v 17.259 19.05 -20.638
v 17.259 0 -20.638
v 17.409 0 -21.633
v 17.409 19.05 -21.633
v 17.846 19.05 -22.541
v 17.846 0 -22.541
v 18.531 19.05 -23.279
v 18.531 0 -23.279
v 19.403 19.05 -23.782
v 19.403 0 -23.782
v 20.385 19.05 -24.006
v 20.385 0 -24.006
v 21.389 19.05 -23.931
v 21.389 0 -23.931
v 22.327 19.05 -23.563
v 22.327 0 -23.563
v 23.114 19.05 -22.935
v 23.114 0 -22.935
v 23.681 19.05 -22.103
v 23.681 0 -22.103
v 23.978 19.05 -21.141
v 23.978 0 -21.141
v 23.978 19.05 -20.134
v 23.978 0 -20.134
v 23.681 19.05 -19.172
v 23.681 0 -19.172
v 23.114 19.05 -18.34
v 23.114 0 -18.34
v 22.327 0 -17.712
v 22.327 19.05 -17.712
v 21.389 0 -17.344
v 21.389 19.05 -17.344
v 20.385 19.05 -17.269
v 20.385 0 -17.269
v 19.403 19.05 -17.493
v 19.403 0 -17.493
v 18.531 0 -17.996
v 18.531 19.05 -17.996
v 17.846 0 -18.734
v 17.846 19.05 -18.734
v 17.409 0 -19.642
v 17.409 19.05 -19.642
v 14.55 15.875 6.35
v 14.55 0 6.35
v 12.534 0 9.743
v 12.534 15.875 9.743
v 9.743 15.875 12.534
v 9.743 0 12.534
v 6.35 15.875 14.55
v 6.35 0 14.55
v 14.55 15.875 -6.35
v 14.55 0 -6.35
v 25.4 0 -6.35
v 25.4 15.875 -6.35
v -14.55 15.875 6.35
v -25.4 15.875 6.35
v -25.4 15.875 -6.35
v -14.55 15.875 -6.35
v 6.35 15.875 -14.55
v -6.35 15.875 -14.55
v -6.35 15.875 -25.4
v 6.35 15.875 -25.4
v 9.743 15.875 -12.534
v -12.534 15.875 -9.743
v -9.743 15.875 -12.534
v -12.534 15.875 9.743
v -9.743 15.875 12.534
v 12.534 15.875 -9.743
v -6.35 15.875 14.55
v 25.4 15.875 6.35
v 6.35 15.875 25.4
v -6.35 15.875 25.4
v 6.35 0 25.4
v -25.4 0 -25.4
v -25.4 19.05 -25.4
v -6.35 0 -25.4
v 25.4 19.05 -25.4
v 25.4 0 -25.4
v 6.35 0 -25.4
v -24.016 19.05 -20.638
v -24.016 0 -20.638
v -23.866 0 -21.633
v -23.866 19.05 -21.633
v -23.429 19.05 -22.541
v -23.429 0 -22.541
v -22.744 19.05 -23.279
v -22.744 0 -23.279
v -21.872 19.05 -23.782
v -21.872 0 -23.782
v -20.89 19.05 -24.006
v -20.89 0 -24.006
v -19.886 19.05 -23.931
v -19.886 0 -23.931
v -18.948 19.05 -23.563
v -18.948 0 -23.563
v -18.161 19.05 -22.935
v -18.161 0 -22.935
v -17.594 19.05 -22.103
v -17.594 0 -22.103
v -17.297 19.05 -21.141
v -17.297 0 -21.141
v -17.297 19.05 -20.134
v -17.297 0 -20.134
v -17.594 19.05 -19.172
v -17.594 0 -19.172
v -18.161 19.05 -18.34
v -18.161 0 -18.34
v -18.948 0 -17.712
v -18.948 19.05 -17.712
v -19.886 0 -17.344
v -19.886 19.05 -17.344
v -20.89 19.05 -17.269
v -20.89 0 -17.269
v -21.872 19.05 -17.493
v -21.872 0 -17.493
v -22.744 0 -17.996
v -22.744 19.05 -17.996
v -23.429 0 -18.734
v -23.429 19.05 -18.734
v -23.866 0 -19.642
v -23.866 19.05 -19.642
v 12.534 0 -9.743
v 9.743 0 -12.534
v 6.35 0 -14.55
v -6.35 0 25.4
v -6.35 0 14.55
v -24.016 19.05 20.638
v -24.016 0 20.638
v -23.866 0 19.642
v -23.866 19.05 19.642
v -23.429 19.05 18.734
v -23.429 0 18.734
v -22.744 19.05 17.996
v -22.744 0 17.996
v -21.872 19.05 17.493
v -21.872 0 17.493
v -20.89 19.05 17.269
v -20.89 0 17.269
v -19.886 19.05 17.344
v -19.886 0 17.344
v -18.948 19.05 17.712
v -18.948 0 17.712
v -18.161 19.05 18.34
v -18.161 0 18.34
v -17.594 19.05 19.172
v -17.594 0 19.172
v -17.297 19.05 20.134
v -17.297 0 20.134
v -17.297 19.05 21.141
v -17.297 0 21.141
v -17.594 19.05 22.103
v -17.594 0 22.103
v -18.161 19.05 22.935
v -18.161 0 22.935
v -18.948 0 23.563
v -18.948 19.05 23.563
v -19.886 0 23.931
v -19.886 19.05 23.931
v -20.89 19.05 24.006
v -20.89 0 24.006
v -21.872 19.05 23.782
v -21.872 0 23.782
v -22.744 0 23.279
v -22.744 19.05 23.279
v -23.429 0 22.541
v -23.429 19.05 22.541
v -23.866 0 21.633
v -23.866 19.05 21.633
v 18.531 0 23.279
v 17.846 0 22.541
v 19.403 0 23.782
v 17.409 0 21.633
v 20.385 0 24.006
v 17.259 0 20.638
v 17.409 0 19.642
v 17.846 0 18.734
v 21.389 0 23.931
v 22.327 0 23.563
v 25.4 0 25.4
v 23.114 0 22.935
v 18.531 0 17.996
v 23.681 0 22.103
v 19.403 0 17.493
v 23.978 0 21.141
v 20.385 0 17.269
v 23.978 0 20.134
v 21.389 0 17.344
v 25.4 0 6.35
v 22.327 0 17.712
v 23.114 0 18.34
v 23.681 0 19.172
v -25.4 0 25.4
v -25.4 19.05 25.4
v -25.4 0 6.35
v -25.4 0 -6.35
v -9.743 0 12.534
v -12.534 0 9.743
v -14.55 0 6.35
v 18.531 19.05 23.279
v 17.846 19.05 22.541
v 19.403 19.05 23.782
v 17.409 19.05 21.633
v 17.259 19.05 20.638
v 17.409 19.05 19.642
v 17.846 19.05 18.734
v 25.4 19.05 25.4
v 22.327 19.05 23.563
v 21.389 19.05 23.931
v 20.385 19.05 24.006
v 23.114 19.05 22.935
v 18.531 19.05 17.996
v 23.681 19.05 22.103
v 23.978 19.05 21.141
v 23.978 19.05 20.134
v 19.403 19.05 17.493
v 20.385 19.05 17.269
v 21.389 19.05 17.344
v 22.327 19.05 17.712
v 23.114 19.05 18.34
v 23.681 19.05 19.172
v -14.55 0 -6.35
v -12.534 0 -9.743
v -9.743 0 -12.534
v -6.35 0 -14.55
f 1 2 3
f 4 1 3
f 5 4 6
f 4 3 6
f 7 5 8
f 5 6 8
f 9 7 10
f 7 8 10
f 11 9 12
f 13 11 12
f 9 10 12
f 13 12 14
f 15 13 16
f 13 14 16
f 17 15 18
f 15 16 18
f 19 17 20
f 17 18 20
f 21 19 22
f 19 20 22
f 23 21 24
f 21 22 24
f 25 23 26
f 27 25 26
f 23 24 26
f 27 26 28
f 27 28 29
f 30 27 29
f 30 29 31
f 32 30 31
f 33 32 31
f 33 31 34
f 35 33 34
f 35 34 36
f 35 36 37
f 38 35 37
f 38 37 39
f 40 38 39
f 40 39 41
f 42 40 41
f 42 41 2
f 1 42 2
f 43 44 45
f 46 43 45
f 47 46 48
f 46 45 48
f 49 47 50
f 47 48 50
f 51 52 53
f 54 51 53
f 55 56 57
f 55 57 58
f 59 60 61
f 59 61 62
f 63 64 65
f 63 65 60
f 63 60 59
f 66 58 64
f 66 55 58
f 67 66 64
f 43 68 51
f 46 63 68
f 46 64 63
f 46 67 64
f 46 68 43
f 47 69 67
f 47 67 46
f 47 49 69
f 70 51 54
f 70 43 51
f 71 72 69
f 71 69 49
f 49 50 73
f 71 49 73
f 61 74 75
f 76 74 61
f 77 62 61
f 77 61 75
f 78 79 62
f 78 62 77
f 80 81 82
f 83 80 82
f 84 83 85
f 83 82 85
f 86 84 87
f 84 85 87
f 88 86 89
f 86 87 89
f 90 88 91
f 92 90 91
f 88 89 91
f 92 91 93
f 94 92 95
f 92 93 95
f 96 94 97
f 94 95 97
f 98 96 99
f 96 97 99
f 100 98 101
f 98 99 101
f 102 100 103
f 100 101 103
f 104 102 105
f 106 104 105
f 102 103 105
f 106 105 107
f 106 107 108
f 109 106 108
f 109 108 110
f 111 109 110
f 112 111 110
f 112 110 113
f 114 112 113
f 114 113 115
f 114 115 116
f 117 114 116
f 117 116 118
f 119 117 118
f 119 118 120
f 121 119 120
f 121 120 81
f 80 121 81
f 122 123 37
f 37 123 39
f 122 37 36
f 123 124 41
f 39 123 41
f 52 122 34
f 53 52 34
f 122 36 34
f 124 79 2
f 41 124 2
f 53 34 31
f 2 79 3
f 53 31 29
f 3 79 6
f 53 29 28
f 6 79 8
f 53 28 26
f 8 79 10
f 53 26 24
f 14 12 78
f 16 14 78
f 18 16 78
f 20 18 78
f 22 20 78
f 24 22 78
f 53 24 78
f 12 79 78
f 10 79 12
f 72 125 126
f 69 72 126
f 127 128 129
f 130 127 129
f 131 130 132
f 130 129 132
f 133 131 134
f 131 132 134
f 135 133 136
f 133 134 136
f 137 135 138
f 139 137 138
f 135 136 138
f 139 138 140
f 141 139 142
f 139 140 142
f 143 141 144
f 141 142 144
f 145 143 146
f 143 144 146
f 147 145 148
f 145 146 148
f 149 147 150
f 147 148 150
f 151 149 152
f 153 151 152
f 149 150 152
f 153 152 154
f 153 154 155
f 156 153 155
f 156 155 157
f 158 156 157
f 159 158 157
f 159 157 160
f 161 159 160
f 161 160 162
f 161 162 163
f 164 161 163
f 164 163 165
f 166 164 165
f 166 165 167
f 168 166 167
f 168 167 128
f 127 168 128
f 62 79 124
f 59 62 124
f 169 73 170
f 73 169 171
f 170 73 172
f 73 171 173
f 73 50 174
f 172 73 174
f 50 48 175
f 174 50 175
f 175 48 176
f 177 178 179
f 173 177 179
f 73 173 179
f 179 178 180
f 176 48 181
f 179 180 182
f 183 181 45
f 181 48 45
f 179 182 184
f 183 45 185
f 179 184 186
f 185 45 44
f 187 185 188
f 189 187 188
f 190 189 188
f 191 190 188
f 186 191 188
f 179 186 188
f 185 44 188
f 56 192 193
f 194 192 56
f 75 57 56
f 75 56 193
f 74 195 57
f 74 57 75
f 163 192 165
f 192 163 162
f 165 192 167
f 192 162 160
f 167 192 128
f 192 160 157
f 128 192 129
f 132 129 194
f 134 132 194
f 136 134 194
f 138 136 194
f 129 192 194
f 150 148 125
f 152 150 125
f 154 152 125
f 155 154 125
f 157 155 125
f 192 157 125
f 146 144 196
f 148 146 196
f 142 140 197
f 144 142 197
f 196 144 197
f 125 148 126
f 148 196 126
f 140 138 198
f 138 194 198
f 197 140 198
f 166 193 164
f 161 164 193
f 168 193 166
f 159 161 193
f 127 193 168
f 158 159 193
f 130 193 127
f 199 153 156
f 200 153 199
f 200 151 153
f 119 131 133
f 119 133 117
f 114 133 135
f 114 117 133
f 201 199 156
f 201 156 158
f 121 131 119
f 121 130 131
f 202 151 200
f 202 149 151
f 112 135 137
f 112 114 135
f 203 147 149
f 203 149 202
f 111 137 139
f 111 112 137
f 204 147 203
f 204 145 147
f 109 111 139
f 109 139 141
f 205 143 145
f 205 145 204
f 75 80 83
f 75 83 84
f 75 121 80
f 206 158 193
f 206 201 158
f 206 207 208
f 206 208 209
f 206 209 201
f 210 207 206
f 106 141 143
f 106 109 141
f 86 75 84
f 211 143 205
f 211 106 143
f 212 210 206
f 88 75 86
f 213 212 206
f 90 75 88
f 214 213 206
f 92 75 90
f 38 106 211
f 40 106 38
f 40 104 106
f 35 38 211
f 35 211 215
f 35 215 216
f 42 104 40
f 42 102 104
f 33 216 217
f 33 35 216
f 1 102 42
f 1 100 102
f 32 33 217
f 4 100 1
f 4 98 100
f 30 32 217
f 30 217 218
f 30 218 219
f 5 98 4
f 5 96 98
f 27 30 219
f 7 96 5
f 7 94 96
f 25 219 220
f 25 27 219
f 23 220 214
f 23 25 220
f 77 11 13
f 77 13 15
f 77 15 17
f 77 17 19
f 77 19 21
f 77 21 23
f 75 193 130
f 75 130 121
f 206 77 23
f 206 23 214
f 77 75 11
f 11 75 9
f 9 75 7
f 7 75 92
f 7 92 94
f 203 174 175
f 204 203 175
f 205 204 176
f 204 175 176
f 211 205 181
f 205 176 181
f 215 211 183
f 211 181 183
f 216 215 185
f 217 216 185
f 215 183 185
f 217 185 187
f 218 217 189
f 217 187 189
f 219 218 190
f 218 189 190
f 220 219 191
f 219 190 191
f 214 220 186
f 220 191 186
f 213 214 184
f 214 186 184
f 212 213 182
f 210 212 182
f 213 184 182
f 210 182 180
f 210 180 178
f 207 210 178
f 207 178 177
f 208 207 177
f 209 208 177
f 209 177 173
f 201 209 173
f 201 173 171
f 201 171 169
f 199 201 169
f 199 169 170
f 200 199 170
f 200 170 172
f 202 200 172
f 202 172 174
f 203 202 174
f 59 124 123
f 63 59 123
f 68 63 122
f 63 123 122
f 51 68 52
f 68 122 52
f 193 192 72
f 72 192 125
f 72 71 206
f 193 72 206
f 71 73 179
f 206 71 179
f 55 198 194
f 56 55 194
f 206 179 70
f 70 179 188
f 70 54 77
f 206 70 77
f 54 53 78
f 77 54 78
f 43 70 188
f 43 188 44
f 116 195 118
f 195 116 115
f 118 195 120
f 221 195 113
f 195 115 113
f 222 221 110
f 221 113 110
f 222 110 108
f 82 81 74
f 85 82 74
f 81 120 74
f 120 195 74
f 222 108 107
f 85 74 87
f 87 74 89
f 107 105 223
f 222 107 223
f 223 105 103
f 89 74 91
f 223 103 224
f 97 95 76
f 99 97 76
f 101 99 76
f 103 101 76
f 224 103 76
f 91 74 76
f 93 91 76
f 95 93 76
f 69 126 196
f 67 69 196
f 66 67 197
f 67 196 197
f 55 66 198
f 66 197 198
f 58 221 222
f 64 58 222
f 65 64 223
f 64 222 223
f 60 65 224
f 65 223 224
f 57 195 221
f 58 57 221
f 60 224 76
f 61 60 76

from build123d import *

# Parameters (mm, degrees)
SKETCH1_W               = 50.8
SKETCH1_H               = 50.8
BOSS_EXTRUDE1_DEPTH     = 19.05
F_1_4_CLEARANCE_HOLE1_D = 6.7564
SKETCH9_W               = 12.7
SKETCH9_H               = 12.7
CUT_EXTRUDE1_DEPTH      = 15.875


with BuildPart() as part:
    # Sketch1 → Boss-Extrude1 (new body)
    with BuildSketch(Plane(origin=(0, 0, 0), x_dir=(1, 0, 0), z_dir=(0, 1, 0))):
        Rectangle(SKETCH1_W, SKETCH1_H)
    extrude(amount=BOSS_EXTRUDE1_DEPTH)

    # 1/4 Clearance Hole1 (through all)
    with Locations(Plane(origin=(0, 19.05, 0), x_dir=(1, 0, 0), z_dir=(0, 1, 0))):
        with Locations((-20.6375, 20.6375), (20.6375, 20.6375), (20.6375, -20.6375), (-20.6375, -20.6375)):
            Hole(F_1_4_CLEARANCE_HOLE1_D / 2)

    # Sketch9 → Cut-Extrude1 (cut)
    with BuildSketch(Plane.XZ):
        with BuildLine():
            ThreePointArc((-6.35, 14.549677831), (-11.225320151, 11.225320151), (-14.549677831, 6.35))
            Line((-14.549677831, 6.35), (-6.35, 6.35))
            Line((-6.35, 6.35), (-6.35, 14.549677831))
        make_face()
        with BuildLine():
            Line((-6.35, 25.4), (-6.35, 14.549677831))
            ThreePointArc((-6.35, 14.549677831), (0, 15.875), (6.35, 14.549677831))
            Line((6.35, 14.549677831), (6.35, 25.4))
            Line((6.35, 25.4), (-6.35, 25.4))
        make_face()
        with BuildLine():
            Line((6.35, 14.549677831), (6.35, 6.35))
            Line((6.35, 6.35), (14.549677831, 6.35))
            ThreePointArc((14.549677831, 6.35), (11.225320151, 11.225320151), (6.35, 14.549677831))
        make_face()
        with BuildLine():
            Line((25.4, 6.35), (14.549677831, 6.35))
            ThreePointArc((14.549677831, 6.35), (15.540137718, 3.243415594), (15.875, 0))
            ThreePointArc((15.875, 0), (15.540137718, -3.243415594), (14.549677831, -6.35))
            Line((14.549677831, -6.35), (25.4, -6.35))
            Line((25.4, -6.35), (25.4, 6.35))
        make_face()
        with BuildLine():
            Line((14.549677831, -6.35), (6.35, -6.35))
            Line((6.35, -6.35), (6.35, -14.549677831))
            ThreePointArc((6.35, -14.549677831), (11.225320151, -11.225320151), (14.549677831, -6.35))
        make_face()
        with BuildLine():
            ThreePointArc((6.35, -14.549677831), (0, -15.875), (-6.35, -14.549677831))
            Line((-6.35, -14.549677831), (-6.35, -25.4))
            Line((-6.35, -25.4), (6.35, -25.4))
            Line((6.35, -25.4), (6.35, -14.549677831))
        make_face()
        with BuildLine():
            Line((-6.35, -6.35), (-14.549677831, -6.35))
            ThreePointArc((-14.549677831, -6.35), (-11.225320151, -11.225320151), (-6.35, -14.549677831))
            Line((-6.35, -14.549677831), (-6.35, -6.35))
        make_face()
        with BuildLine():
            Line((-14.549677831, 6.35), (-25.4, 6.35))
            Line((-25.4, 6.35), (-25.4, -6.35))
            Line((-25.4, -6.35), (-14.549677831, -6.35))
            ThreePointArc((-14.549677831, -6.35), (-15.875, 0), (-14.549677831, 6.35))
        make_face()
        with BuildLine():
            Line((-6.35, 6.35), (-14.549677831, 6.35))
            ThreePointArc((-14.549677831, 6.35), (-15.875, 0), (-14.549677831, -6.35))
            Line((-14.549677831, -6.35), (-6.35, -6.35))
            Line((-6.35, -6.35), (-6.35, 6.35))
        make_face()
        with BuildLine():
            Line((6.35, -6.35), (-6.35, -6.35))
            Line((-6.35, -6.35), (-6.35, -14.549677831))
            ThreePointArc((-6.35, -14.549677831), (0, -15.875), (6.35, -14.549677831))
            Line((6.35, -14.549677831), (6.35, -6.35))
        make_face()
        with BuildLine():
            Line((14.549677831, 6.35), (6.35, 6.35))
            Line((6.35, 6.35), (6.35, -6.35))
            Line((6.35, -6.35), (14.549677831, -6.35))
            ThreePointArc((14.549677831, -6.35), (15.540137718, -3.243415594), (15.875, 0))
            ThreePointArc((15.875, 0), (15.540137718, 3.243415594), (14.549677831, 6.35))
        make_face()
        Rectangle(SKETCH9_W, SKETCH9_H)
        with BuildLine():
            Line((-6.35, 14.549677831), (-6.35, 6.35))
            Line((-6.35, 6.35), (6.35, 6.35))
            Line((6.35, 6.35), (6.35, 14.549677831))
            ThreePointArc((6.35, 14.549677831), (0, 15.875), (-6.35, 14.549677831))
        make_face()
    extrude(amount=-CUT_EXTRUDE1_DEPTH, mode=Mode.SUBTRACT)


solid = part.part
